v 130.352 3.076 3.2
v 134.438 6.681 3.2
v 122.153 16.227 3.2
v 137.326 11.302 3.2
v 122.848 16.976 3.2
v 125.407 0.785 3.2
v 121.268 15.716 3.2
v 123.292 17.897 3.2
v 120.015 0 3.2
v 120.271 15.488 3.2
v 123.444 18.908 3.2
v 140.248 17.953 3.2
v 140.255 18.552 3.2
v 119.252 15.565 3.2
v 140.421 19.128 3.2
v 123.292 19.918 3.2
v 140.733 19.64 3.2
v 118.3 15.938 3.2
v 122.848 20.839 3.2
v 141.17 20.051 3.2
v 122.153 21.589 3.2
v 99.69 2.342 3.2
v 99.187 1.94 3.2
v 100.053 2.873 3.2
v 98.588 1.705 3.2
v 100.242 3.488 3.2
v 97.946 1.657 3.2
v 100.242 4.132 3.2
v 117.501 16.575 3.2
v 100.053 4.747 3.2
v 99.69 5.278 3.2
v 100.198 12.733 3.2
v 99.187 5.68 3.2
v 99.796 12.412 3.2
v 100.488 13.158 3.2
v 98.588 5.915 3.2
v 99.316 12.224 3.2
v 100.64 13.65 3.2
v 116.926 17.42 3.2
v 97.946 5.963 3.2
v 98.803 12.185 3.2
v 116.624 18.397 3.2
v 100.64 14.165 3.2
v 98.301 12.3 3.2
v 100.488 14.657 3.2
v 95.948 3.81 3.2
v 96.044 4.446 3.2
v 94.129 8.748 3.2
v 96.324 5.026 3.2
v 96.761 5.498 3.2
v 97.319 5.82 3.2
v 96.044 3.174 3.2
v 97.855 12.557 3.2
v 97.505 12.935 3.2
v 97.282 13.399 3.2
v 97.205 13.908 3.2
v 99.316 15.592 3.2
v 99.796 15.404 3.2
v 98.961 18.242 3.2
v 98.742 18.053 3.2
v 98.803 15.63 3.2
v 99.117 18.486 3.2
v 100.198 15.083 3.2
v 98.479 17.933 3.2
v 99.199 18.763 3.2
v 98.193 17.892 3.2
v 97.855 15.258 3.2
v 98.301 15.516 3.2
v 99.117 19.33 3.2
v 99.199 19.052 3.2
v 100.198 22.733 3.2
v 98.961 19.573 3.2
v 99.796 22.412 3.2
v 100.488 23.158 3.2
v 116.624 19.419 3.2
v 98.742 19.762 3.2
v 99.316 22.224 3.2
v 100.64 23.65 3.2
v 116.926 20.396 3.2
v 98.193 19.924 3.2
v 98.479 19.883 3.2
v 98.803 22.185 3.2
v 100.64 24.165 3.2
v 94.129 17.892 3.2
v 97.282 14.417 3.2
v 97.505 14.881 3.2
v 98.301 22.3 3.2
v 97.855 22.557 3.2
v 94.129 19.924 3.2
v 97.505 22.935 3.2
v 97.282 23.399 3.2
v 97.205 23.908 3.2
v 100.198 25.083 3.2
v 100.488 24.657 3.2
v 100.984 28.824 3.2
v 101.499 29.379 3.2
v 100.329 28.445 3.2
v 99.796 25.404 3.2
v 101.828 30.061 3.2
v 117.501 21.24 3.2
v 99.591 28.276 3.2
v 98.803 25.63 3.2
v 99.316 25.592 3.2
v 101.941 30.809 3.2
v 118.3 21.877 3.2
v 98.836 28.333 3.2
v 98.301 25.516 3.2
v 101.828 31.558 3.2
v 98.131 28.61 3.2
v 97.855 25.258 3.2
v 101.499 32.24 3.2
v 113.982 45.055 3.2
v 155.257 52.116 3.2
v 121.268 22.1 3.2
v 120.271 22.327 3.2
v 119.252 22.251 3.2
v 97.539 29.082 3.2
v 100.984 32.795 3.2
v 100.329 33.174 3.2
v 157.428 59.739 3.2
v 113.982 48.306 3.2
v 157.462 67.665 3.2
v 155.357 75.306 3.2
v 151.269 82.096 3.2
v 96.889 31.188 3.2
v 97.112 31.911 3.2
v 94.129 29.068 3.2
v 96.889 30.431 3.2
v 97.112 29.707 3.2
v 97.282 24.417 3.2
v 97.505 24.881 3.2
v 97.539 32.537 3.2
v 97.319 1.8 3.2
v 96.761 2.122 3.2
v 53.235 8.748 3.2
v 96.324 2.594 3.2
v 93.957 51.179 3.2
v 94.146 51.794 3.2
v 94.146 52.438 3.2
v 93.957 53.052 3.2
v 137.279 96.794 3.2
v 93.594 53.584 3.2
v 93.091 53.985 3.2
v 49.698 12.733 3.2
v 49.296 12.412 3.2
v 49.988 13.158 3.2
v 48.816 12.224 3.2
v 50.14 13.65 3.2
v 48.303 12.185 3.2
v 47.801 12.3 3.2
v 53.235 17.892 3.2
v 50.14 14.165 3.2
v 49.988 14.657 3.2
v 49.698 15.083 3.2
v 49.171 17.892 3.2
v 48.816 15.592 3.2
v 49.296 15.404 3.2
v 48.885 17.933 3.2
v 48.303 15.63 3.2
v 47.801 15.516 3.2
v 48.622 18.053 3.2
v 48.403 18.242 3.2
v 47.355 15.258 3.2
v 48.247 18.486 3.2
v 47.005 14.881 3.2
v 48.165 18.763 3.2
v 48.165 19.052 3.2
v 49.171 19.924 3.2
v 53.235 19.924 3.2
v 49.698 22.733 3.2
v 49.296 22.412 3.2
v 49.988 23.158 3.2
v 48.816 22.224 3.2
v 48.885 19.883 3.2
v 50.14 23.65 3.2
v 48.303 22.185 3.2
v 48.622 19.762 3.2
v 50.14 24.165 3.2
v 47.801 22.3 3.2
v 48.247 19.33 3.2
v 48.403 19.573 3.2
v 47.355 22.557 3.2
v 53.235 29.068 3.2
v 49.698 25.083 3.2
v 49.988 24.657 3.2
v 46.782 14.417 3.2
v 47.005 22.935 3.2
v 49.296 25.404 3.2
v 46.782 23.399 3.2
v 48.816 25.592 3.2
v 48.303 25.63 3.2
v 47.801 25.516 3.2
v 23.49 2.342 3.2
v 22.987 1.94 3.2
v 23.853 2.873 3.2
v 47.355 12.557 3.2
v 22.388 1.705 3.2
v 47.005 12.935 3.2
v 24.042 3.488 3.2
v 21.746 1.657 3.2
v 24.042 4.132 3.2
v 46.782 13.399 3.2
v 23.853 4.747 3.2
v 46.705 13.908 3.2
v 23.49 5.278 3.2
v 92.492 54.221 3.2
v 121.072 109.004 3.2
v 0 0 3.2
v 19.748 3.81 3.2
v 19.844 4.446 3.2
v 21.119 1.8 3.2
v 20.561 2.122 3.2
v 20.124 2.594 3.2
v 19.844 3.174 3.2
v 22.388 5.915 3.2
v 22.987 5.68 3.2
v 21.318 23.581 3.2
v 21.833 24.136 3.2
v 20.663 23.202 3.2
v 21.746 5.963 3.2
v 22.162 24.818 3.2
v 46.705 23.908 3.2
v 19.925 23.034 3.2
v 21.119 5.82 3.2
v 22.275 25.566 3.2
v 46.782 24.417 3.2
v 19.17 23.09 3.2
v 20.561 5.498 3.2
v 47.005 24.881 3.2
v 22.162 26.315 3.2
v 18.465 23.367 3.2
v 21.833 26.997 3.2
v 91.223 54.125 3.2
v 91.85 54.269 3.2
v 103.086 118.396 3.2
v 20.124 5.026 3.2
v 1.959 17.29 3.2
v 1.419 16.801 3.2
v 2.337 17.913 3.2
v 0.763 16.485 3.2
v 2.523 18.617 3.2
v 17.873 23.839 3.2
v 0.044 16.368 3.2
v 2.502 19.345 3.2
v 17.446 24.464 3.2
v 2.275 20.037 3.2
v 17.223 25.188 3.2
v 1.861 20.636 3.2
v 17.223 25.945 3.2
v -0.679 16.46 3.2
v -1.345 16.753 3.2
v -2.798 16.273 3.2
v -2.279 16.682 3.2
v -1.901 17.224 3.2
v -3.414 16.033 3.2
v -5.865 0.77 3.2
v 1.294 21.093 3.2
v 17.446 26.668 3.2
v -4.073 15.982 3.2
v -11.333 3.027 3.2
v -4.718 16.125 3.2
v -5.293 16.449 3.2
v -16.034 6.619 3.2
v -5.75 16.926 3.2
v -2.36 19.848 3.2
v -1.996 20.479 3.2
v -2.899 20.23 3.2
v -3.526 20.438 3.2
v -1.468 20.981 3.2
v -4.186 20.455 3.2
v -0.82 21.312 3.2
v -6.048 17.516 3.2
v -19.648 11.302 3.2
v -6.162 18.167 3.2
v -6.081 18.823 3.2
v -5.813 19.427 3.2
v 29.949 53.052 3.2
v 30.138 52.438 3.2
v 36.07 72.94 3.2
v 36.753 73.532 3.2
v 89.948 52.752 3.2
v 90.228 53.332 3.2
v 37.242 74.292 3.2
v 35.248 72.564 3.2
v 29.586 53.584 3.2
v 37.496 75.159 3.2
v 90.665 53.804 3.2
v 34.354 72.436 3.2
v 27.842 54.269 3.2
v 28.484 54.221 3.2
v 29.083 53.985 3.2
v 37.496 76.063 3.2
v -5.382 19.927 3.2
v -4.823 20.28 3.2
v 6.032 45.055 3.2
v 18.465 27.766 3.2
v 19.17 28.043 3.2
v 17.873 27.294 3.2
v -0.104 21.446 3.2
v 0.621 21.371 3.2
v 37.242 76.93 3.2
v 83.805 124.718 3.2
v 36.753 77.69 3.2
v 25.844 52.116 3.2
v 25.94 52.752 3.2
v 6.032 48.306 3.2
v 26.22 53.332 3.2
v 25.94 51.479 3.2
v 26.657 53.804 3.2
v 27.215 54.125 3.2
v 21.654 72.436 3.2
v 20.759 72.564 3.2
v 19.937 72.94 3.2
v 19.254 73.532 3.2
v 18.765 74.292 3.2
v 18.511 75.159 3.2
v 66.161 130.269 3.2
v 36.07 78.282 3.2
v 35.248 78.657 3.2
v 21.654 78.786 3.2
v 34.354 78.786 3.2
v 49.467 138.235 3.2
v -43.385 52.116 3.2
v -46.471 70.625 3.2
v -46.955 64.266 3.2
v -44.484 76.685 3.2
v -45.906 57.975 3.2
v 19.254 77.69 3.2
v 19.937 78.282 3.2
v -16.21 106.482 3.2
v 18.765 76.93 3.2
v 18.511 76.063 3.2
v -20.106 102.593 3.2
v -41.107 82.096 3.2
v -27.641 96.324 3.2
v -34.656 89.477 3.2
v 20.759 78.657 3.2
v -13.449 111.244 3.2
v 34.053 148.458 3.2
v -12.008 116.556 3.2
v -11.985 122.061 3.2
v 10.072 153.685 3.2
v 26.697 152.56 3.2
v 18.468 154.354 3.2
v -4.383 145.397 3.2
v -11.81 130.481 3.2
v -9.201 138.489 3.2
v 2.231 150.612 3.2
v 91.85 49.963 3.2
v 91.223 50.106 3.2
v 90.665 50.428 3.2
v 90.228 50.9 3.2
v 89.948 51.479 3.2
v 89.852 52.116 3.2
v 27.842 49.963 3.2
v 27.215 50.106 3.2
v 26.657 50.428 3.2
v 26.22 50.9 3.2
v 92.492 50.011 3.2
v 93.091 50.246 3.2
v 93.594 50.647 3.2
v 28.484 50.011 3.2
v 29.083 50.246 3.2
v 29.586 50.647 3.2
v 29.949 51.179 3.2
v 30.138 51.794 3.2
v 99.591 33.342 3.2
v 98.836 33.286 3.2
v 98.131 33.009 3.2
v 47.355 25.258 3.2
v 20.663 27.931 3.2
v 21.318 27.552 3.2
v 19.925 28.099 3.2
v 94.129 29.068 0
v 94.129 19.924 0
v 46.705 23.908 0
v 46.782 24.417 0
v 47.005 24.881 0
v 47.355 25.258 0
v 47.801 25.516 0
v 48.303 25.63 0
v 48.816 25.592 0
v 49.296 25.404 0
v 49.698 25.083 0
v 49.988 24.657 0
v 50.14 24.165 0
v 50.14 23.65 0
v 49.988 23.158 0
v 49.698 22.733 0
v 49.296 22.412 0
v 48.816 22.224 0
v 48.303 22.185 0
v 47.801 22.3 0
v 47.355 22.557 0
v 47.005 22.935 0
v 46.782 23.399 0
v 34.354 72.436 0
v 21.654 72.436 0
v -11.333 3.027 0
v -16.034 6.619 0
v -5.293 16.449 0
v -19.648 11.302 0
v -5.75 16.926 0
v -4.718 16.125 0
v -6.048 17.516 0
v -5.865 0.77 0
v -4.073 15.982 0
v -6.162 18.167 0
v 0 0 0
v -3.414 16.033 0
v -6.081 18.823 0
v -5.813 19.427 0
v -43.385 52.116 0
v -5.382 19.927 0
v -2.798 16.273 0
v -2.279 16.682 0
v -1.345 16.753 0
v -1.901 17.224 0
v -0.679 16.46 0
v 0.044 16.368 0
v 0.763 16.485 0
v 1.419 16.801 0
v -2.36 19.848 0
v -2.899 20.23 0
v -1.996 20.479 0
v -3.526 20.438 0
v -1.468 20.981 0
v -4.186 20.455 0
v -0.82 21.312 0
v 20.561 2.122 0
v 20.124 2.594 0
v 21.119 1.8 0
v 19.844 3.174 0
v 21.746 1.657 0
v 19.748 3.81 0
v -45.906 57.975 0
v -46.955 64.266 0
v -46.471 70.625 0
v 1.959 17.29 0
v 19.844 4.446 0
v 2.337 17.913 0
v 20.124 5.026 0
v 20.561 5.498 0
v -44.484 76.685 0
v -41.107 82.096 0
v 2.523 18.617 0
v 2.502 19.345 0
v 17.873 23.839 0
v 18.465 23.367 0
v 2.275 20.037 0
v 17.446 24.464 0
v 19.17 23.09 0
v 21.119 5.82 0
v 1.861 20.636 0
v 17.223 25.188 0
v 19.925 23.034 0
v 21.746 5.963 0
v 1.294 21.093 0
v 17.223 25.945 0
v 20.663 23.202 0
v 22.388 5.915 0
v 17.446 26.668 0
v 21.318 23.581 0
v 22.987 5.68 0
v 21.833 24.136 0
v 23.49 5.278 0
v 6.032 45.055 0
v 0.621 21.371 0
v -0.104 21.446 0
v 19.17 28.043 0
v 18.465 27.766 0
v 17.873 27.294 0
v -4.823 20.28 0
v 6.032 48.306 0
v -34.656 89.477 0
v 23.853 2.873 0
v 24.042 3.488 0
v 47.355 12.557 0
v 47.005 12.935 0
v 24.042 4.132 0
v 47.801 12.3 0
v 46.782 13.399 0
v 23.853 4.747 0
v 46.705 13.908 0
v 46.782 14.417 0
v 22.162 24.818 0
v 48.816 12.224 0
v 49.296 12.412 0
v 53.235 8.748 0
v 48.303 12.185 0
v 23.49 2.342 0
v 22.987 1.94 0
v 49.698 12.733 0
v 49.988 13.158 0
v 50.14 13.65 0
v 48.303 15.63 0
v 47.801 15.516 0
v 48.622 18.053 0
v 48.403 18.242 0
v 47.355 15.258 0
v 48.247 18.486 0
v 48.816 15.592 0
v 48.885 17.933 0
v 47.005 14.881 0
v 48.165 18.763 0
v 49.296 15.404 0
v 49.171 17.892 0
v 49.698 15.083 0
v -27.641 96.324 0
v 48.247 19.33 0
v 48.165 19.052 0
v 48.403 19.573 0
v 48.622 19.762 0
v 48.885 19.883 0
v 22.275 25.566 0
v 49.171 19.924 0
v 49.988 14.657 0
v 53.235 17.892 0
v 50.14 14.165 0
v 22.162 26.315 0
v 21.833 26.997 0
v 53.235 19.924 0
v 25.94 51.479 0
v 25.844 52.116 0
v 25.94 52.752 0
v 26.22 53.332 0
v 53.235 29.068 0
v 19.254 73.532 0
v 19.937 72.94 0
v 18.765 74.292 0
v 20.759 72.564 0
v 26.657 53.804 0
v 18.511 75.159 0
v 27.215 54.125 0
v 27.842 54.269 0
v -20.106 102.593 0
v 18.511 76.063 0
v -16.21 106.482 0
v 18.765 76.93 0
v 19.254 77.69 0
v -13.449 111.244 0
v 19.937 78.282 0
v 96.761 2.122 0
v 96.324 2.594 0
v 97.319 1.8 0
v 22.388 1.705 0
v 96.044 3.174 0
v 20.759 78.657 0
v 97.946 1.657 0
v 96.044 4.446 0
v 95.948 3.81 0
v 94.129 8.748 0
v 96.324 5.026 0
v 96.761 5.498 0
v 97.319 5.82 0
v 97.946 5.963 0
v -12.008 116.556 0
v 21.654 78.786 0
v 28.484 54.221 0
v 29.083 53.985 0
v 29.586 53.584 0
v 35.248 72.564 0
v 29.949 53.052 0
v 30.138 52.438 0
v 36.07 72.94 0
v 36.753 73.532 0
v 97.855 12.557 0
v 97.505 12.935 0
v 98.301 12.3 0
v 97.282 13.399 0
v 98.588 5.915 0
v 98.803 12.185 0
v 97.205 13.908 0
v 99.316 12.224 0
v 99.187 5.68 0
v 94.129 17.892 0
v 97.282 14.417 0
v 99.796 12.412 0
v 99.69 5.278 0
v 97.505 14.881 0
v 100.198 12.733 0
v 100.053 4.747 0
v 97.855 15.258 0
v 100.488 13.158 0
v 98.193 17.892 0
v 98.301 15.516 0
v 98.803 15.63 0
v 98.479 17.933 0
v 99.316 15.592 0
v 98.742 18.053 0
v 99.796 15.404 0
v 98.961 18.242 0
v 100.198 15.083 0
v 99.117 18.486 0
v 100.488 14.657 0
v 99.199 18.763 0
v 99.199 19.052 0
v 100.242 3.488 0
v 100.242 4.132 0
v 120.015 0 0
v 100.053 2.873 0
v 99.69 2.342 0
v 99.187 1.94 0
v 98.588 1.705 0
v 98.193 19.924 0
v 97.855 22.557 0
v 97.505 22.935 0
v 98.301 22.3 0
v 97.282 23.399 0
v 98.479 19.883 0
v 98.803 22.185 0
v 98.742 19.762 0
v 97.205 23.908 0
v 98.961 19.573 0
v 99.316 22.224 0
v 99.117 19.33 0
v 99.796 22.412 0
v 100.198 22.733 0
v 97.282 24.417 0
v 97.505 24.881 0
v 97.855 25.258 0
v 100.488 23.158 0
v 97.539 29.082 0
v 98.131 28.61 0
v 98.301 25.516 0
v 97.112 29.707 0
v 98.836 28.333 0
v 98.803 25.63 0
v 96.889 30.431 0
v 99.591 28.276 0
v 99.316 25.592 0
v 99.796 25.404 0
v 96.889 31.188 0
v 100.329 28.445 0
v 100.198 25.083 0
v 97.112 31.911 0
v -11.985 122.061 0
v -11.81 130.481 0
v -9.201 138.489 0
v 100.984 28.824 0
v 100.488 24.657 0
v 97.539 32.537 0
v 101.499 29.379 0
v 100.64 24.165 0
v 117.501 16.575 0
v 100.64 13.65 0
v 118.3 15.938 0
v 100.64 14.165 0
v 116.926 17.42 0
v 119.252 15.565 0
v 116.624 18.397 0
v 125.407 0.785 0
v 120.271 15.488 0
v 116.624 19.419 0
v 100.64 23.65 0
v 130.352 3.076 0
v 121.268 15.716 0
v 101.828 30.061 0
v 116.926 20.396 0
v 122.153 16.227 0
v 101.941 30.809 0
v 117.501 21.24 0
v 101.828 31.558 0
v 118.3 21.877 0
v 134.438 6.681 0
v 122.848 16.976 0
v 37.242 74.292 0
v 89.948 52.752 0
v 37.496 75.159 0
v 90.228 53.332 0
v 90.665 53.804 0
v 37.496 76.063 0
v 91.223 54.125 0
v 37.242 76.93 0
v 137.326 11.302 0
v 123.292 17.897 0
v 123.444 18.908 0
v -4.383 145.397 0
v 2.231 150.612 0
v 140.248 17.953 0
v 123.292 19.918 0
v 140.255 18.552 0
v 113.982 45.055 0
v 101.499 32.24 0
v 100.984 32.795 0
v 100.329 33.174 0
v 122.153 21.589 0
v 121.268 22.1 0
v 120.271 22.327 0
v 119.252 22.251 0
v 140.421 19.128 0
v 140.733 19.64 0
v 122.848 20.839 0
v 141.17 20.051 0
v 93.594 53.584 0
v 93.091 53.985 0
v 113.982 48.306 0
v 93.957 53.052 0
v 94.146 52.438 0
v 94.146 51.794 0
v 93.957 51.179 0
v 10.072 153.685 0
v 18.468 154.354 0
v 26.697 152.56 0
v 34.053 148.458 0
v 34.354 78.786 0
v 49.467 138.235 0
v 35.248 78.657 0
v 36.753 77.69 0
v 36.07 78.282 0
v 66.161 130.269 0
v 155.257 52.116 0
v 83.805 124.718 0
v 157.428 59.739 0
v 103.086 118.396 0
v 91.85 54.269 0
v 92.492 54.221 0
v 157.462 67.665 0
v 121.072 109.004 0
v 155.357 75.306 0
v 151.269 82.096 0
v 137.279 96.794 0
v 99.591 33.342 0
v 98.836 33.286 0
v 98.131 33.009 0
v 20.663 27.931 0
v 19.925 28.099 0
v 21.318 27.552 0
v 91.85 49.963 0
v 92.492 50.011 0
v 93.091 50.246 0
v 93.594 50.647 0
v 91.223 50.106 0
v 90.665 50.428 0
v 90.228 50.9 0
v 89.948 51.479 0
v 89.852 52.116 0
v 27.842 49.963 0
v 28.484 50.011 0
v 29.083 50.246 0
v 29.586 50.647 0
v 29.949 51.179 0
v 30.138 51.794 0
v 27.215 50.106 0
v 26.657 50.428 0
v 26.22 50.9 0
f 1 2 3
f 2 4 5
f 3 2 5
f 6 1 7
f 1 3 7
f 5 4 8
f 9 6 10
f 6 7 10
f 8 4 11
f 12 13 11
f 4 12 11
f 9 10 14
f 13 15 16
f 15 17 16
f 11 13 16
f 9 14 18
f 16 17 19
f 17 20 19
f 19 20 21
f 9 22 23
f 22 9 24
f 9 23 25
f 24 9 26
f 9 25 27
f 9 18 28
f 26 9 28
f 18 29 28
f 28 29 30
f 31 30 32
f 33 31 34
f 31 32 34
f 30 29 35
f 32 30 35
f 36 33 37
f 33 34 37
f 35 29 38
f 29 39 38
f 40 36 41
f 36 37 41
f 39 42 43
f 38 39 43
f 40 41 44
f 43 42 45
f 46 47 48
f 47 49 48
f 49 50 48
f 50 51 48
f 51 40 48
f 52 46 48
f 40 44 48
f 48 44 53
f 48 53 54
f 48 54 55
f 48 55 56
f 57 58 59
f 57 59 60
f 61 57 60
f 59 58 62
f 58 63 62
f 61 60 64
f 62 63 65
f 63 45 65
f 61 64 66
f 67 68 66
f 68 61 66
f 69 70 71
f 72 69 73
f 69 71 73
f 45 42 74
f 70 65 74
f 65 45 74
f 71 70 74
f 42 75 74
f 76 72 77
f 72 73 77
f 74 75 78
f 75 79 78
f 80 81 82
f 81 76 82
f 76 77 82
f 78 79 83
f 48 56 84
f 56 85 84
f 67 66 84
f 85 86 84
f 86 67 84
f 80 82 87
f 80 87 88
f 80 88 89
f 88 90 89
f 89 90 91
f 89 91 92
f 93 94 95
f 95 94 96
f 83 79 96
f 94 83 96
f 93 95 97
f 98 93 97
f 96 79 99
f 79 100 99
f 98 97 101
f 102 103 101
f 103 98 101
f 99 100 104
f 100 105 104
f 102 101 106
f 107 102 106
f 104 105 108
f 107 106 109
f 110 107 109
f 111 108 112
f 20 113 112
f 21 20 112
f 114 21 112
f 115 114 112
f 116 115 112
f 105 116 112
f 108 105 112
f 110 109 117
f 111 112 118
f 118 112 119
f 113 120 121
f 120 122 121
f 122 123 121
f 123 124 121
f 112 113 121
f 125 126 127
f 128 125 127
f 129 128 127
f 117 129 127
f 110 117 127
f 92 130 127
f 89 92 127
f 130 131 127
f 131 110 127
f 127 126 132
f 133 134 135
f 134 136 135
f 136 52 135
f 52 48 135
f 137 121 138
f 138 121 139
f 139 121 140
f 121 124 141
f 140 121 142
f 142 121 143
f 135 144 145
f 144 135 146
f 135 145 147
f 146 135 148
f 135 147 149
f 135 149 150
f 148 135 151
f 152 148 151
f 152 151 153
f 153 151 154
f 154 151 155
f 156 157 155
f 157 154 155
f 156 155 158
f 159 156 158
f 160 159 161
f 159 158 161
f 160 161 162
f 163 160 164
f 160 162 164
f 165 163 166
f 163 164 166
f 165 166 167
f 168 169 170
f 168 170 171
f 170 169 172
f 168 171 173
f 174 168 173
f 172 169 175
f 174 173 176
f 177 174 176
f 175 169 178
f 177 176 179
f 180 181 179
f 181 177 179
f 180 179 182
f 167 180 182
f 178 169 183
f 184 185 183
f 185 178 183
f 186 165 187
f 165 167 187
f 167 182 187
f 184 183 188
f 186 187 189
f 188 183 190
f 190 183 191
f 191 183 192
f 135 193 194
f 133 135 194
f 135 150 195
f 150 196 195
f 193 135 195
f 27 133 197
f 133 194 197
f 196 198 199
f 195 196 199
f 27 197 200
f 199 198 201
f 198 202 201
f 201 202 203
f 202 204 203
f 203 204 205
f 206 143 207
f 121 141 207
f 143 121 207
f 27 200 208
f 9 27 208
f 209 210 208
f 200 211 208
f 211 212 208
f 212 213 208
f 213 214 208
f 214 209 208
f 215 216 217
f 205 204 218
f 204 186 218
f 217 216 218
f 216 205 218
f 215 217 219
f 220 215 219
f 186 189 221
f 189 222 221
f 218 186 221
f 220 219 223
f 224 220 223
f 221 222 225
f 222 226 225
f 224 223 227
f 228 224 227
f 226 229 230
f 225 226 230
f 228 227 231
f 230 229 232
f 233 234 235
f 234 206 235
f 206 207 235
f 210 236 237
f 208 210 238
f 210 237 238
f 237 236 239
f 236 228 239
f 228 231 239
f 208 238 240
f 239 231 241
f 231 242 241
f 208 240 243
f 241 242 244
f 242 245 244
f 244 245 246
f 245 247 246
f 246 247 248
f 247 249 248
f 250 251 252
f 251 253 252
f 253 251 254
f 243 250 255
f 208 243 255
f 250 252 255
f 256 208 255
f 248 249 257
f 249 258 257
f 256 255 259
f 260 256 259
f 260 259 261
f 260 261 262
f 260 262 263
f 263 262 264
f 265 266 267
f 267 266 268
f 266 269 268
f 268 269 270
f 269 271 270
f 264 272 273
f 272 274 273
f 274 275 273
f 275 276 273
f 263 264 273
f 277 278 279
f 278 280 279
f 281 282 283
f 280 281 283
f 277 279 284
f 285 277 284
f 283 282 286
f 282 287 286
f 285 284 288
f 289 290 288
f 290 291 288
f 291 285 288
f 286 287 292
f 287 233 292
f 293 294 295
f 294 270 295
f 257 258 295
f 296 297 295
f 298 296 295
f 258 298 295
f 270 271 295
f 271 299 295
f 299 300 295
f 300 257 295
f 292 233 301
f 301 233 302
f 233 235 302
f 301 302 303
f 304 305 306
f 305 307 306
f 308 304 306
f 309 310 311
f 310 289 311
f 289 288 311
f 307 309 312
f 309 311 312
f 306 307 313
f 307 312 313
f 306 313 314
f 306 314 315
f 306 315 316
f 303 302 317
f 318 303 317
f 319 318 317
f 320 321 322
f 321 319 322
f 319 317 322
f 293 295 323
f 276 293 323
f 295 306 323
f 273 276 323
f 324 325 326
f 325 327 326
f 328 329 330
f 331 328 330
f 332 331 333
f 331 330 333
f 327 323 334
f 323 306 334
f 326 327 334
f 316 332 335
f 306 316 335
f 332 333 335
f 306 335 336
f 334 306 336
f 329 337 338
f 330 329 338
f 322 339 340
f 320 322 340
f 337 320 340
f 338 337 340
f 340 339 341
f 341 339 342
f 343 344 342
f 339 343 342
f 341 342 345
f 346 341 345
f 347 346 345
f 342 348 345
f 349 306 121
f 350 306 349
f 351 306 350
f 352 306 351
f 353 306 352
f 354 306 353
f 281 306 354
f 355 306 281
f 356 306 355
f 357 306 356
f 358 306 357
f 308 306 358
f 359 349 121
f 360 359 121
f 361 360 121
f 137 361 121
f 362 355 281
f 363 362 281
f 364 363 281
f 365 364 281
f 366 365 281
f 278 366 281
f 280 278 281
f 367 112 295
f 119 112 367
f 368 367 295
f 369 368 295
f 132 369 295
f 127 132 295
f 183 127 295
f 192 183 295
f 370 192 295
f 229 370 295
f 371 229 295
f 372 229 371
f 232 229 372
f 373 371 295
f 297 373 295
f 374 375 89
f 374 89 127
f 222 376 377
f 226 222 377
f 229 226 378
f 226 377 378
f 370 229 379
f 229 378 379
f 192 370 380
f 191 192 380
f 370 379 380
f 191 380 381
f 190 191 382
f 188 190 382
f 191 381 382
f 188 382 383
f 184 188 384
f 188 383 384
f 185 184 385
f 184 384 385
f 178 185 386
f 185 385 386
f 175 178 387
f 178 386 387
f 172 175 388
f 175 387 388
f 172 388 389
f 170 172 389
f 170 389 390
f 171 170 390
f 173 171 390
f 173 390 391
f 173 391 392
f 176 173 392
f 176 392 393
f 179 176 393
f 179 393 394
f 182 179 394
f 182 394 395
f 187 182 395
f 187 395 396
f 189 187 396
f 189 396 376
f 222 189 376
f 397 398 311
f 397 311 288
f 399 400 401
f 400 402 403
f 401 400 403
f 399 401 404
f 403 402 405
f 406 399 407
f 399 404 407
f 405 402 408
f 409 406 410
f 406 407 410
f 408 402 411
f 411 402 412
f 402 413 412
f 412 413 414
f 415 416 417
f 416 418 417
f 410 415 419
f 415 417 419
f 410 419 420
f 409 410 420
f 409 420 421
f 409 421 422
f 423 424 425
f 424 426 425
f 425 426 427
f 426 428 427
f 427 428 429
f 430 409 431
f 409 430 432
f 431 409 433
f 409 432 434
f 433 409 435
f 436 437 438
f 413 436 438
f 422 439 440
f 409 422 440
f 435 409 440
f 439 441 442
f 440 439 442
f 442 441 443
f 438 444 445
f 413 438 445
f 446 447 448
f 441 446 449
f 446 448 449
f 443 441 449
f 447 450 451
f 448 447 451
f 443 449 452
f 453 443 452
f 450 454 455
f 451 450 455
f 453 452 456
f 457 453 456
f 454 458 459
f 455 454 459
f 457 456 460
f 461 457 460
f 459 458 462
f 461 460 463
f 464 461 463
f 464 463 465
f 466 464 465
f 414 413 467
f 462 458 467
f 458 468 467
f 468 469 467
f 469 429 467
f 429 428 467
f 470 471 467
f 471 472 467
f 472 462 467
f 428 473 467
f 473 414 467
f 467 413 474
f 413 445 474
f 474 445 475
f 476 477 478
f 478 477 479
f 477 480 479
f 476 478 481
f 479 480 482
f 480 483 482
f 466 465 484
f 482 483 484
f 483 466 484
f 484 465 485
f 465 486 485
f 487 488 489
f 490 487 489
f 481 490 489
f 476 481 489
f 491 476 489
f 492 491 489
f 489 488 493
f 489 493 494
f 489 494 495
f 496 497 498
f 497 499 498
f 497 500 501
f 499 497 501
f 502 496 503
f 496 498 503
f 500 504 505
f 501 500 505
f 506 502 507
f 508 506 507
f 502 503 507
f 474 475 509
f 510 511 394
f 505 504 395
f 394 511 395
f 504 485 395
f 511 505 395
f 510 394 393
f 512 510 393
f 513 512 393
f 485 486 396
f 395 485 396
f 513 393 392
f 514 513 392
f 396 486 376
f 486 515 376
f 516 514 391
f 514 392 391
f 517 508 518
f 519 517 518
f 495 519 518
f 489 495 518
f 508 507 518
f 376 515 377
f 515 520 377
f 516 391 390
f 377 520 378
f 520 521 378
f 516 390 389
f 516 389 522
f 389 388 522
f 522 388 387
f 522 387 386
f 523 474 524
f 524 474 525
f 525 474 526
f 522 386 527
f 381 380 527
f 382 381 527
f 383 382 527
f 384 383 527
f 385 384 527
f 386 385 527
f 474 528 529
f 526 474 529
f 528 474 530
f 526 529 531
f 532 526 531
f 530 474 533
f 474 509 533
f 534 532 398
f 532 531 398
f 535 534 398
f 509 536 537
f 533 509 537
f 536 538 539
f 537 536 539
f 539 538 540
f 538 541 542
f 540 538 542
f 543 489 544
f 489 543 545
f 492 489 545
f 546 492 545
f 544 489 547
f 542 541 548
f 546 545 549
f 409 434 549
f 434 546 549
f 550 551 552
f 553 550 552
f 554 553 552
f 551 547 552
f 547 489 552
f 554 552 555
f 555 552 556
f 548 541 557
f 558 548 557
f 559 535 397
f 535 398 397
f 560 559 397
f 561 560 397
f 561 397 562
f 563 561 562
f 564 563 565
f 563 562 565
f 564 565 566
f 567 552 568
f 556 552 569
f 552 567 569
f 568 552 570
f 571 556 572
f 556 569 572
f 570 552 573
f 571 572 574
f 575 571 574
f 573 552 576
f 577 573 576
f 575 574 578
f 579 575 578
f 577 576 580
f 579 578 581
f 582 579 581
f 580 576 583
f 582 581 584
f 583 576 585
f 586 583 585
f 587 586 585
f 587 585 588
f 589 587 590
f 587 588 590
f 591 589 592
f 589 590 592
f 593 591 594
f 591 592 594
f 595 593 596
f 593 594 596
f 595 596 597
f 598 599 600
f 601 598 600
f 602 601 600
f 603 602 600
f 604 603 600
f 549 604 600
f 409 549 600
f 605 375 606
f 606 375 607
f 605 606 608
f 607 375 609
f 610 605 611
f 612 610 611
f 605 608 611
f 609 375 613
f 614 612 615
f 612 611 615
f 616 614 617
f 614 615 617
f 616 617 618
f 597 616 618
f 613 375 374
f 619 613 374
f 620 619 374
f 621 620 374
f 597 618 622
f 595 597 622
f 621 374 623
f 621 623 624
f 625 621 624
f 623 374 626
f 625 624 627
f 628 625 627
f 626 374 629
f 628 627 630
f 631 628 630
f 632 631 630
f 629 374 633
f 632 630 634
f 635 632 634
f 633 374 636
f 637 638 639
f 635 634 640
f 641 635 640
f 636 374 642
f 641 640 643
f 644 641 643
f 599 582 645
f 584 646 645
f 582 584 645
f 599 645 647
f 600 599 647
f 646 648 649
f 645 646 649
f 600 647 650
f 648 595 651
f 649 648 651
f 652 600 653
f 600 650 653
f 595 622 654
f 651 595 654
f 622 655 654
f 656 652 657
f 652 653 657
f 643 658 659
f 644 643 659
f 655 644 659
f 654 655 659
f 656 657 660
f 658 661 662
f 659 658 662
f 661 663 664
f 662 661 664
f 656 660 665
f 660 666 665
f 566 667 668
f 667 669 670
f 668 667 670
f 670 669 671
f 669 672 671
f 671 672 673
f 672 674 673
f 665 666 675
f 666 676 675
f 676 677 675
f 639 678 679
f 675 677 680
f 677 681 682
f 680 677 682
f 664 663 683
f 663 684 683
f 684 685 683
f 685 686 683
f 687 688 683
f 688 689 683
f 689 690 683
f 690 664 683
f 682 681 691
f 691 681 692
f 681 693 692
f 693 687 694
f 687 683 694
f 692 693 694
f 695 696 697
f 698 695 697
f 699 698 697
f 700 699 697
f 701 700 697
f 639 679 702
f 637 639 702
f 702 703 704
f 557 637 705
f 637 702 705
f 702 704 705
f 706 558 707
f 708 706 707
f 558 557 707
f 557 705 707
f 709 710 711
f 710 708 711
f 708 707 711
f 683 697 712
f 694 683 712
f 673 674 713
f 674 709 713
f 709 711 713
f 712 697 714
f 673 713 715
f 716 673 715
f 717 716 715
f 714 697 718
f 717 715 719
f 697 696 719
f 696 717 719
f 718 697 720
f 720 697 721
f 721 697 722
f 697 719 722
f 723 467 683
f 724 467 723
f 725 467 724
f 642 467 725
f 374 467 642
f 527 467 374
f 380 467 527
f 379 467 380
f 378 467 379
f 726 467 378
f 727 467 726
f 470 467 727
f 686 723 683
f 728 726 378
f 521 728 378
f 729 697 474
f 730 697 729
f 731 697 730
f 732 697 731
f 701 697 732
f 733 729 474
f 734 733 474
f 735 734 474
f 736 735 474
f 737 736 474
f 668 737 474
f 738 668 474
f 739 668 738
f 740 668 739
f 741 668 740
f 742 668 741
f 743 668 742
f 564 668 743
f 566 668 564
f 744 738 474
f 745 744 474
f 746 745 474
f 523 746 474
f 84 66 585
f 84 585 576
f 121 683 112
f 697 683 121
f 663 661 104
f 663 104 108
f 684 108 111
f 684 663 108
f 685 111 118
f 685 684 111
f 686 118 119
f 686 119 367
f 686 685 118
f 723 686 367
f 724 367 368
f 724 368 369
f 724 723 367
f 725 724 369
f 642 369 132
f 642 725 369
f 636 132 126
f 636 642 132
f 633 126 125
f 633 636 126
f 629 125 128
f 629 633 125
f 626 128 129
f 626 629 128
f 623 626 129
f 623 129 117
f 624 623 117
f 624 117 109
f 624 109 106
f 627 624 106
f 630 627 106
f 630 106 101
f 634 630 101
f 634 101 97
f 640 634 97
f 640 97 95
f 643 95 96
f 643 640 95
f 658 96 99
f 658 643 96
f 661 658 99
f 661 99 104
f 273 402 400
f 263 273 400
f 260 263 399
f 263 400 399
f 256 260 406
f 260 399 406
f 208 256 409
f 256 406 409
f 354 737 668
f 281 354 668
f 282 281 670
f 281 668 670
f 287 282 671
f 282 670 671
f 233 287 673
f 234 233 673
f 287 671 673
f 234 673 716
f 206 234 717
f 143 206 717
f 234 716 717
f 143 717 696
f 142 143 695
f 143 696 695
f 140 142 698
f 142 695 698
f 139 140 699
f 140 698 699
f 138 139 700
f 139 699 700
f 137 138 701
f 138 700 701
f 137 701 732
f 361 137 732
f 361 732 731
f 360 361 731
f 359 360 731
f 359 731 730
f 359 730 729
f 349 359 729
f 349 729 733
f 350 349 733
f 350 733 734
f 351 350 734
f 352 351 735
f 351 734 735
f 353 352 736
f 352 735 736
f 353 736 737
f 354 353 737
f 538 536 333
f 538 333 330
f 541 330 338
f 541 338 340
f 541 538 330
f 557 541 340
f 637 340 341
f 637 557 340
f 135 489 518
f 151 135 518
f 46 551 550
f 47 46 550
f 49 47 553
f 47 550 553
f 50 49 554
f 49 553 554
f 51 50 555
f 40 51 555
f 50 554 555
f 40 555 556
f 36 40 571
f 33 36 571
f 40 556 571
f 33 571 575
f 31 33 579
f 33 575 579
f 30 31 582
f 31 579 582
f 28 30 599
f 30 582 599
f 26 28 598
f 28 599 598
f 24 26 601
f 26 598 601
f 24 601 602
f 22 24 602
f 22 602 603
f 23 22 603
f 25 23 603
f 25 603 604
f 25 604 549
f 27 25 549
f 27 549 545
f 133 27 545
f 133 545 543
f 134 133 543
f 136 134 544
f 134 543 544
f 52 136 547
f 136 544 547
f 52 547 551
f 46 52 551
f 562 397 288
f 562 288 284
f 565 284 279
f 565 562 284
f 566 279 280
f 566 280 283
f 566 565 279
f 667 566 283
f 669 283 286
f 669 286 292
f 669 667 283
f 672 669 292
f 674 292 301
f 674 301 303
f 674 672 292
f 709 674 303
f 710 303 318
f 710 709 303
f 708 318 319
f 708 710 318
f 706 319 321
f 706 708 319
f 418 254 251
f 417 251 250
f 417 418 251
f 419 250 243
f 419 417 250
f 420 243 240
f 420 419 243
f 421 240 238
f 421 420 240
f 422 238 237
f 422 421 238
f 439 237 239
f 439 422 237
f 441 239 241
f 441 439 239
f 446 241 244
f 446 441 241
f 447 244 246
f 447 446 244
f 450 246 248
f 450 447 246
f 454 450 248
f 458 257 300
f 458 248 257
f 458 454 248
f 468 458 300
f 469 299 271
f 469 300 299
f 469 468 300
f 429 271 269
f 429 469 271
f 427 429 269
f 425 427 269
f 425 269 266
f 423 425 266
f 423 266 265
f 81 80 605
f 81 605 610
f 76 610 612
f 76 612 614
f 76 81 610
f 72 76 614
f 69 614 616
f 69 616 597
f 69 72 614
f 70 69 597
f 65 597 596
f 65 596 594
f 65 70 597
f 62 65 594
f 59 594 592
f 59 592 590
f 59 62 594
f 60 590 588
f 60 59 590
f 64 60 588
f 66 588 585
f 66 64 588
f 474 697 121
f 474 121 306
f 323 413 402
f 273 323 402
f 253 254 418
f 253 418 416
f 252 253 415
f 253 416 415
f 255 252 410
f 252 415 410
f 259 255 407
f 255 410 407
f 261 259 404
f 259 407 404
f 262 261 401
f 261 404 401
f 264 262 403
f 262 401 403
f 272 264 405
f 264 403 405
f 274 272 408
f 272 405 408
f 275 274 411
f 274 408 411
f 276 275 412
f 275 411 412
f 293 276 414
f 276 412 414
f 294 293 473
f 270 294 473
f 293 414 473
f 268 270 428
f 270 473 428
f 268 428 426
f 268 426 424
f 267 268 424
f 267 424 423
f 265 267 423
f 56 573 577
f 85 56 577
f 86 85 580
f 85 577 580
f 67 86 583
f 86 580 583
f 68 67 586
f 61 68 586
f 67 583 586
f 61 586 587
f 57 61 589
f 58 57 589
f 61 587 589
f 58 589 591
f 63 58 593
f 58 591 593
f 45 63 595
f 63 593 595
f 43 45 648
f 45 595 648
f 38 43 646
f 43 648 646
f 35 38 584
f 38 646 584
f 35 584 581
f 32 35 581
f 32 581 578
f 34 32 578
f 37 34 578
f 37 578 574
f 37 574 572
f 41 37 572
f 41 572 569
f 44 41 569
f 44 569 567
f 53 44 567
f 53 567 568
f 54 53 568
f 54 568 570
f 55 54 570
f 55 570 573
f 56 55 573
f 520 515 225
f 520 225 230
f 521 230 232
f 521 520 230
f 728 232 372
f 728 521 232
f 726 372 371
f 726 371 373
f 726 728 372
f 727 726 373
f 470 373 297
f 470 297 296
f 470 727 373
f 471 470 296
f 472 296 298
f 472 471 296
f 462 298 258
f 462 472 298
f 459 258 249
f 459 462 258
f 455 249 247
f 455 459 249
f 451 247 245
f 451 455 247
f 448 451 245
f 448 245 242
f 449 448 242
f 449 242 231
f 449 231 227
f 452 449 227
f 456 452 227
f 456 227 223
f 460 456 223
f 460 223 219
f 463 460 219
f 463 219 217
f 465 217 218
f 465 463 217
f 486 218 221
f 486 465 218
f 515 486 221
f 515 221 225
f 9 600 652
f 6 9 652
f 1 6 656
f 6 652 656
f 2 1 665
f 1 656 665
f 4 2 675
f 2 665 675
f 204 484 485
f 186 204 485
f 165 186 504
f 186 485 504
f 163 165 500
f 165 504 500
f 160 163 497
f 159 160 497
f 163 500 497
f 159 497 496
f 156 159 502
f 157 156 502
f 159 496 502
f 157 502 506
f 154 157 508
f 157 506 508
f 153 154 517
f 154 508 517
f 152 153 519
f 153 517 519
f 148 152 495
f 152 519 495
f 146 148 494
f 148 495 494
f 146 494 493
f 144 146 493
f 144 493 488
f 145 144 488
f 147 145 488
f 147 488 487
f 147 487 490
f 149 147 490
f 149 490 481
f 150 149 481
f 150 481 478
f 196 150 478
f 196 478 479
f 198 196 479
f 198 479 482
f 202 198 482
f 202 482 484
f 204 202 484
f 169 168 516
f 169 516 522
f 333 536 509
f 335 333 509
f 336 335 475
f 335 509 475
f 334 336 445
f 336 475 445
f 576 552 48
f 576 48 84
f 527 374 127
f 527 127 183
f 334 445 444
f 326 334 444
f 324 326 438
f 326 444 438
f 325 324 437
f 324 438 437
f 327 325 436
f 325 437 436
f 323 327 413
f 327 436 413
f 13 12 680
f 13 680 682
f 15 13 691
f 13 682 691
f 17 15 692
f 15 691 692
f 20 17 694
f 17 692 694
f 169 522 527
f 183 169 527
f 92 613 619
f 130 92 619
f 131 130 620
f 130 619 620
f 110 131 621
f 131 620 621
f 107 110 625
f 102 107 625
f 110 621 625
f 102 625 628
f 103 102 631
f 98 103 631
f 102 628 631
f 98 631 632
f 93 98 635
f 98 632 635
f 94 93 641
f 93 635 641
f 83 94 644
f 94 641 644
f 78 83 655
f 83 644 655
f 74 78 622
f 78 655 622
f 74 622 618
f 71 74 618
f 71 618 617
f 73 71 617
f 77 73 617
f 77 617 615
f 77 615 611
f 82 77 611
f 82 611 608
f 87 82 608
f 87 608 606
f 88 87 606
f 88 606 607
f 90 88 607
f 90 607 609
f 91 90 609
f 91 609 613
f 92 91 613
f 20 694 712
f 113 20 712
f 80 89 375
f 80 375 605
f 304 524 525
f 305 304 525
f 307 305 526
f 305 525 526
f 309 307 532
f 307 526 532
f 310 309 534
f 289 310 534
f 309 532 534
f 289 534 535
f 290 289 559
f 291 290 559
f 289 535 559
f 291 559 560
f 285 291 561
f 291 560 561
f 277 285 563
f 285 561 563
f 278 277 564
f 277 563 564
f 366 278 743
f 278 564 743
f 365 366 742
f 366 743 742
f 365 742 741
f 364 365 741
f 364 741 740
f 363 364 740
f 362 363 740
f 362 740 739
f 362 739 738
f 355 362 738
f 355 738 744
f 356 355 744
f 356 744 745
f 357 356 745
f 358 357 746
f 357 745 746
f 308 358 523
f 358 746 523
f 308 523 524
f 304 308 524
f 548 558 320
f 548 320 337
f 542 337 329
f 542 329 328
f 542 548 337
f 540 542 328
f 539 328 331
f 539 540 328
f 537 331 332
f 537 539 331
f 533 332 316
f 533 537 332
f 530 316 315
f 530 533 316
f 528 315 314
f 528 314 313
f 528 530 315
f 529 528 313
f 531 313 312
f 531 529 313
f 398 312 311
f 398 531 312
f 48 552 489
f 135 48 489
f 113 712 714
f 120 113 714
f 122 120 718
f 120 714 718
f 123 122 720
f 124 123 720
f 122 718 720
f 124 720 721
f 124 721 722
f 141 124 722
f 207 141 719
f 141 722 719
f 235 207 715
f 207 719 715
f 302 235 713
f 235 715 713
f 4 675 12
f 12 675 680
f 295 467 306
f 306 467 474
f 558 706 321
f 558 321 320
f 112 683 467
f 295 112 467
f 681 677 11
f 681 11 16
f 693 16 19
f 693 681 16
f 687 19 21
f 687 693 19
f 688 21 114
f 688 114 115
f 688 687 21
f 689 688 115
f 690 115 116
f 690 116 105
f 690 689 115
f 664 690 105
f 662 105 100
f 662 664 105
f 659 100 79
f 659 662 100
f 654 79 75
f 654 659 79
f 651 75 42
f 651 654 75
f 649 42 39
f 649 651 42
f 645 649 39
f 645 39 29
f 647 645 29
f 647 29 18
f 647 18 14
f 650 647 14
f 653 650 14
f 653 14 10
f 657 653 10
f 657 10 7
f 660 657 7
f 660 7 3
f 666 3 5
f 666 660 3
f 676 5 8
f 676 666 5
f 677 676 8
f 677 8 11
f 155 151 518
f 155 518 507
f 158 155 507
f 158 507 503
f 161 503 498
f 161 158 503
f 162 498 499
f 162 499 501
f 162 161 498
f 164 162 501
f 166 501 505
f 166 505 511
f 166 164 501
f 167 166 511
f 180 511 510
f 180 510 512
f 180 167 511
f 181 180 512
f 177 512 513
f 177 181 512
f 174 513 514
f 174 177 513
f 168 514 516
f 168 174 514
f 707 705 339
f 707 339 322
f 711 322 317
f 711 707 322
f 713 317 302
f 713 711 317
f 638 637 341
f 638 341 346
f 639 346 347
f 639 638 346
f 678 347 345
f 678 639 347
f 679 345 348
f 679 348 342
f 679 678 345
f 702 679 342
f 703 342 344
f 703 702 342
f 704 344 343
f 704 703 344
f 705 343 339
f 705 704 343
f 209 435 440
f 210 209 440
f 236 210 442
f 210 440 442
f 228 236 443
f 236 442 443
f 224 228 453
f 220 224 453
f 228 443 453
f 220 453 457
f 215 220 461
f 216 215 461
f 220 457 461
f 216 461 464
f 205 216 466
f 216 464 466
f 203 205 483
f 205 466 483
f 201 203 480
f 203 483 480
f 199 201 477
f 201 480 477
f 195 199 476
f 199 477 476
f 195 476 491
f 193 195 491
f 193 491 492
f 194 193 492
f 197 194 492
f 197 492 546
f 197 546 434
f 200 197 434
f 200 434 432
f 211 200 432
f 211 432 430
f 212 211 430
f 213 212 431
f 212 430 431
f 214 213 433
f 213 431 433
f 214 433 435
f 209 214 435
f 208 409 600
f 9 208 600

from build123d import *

# Parameters (mm, degrees)
SKETCH1_R           = 3.429
SKETCH1_R_2         = 2.54
BOSS_EXTRUDE1_DEPTH = 3.2004
SKETCH2_R           = 2.159
CUT_EXTRUDE1_DEPTH  = 3.2004
SKETCH5_R           = 1.7272
SKETCH5_W           = 40.894
SKETCH5_H           = 20.32
CUT_EXTRUDE3_DEPTH  = 4.2004
CUT_EXTRUDE4_DEPTH  = 3.2004
CUT_EXTRUDE8_DEPTH  = 3.2004
SKETCH11_W          = 107.95
SKETCH11_H          = 3.2512
CUT_EXTRUDE9_DEPTH  = 3.2004
SKETCH12_R          = 2.2479
CUT_EXTRUDE10_DEPTH = 3.2004
BOSS_EXTRUDE2_DEPTH = 3.2004


with BuildPart() as part:
    # Sketch1 → Boss-Extrude1 (new body)
    with BuildSketch(Plane.XY):
        with BuildLine():
            Line((0, 0), (120.015, 0))
            ThreePointArc((120.015, 0), (130.351788397, 3.075697789), (137.325636158, 11.302152593))
            Line((137.325636158, 11.302152593), (155.257499999, 52.11572))
            ThreePointArc((155.257499999, 52.11572), (157.462147967, 67.664529981), (151.26869294, 82.095991421))
            ThreePointArc((151.26869294, 82.095991421), (55.081013593, 128.103082212), (-41.106665754, 82.095991421))
            ThreePointArc((-41.106665754, 82.095991421), (-46.904819593, 67.459968464), (-43.385473773, 52.11572))
            Line((-43.385473773, 52.11572), (-19.648099871, 11.302152593))
            ThreePointArc((-19.648099871, 11.302152593), (-11.333429333, 3.027112684), (0, 0))
        make_face()
        with Locations((120.015, 18.90776)):
            Circle(SKETCH1_R, mode=Mode.SUBTRACT)
        with Locations((0, 18.90776)):
            Circle(SKETCH1_R_2, mode=Mode.SUBTRACT)
        with Locations((19.734727626, 25.566426992)):
            Circle(SKETCH1_R_2, mode=Mode.SUBTRACT)
        with Locations((99.400822531, 30.809360911)):
            Circle(SKETCH1_R_2, mode=Mode.SUBTRACT)
    extrude(amount=BOSS_EXTRUDE1_DEPTH)

    # Sketch2 → Cut-Extrude1 (cut)
    with BuildSketch(Plane(origin=(0, 0, 0), x_dir=(-1, 0, 0), z_dir=(0, 0, -1))):
        with Locations((-92.0115, 52.115719911)):
            Circle(SKETCH2_R)
        with Locations((-28.0035, 52.115719911)):
            Circle(SKETCH2_R)
        with Locations((-98.1075, 3.81)):
            Circle(SKETCH2_R)
        with Locations((-21.9075, 3.81)):
            Circle(SKETCH2_R)
    extrude(amount=-CUT_EXTRUDE1_DEPTH, mode=Mode.SUBTRACT)

    # Sketch5 → Cut-Extrude3 (cut, through all)
    with BuildSketch(Plane(origin=(0, 0, 0), x_dir=(-1, 0, 0), z_dir=(0, 0, -1))):
        with Locations((-98.932021292, 23.90776)):
            Circle(SKETCH5_R)
        with Locations((-48.432021292, 13.90776)):
            Circle(SKETCH5_R)
        with Locations((-48.432021292, 23.90776)):
            Circle(SKETCH5_R)
        with Locations((-98.932021292, 13.90776)):
            Circle(SKETCH5_R)
        with Locations((-73.682021292, 18.90776)):
            Rectangle(SKETCH5_W, SKETCH5_H)
    extrude(amount=-CUT_EXTRUDE3_DEPTH, mode=Mode.SUBTRACT)

    # Sketch6 → Cut-Extrude4 (cut)
    with BuildSketch(Plane.XY.offset(3.2004)):
        with BuildLine():
            Line((49.171021292, 19.92376), (53.235021292, 19.92376))
            Line((53.235021292, 19.92376), (53.235021292, 17.89176))
            Line((53.235021292, 17.89176), (49.171021292, 17.89176))
            ThreePointArc((49.171021292, 17.89176), (48.155021292, 18.90776), (49.171021292, 19.92376))
        make_face()
        with BuildLine():
            Line((94.129021292, 19.92376), (98.193021292, 19.92376))
            ThreePointArc((98.193021292, 19.92376), (99.209021292, 18.90776), (98.193021292, 17.89176))
            Line((98.193021292, 17.89176), (94.129021292, 17.89176))
            Line((94.129021292, 17.89176), (94.129021292, 19.92376))
        make_face()
    extrude(amount=-CUT_EXTRUDE4_DEPTH, mode=Mode.SUBTRACT)

    # Sketch10 → Cut-Extrude8 (cut)
    with BuildSketch(Plane(origin=(0, 0, 0), x_dir=(-1, 0, 0), z_dir=(0, 0, -1))):
        with BuildLine():
            Line((-34.3535, 78.785719911), (-21.6535, 78.785719911))
            ThreePointArc((-21.6535, 78.785719911), (-18.4785, 75.610719911), (-21.6535, 72.435719911))
            Line((-21.6535, 72.435719911), (-34.3535, 72.435719911))
            ThreePointArc((-34.3535, 72.435719911), (-37.5285, 75.610719911), (-34.3535, 78.785719911))
        make_face()
    extrude(amount=-CUT_EXTRUDE8_DEPTH, mode=Mode.SUBTRACT)

    # Sketch11 → Cut-Extrude9 (cut)
    with BuildSketch(Plane(origin=(0, 0, 0), x_dir=(-1, 0, 0), z_dir=(0, 0, -1))):
        with Locations((-60.0075, 46.680119911)):
            Rectangle(SKETCH11_W, SKETCH11_H)
    extrude(amount=-CUT_EXTRUDE9_DEPTH, mode=Mode.SUBTRACT)

    # Sketch12 → Cut-Extrude10 (cut)
    with BuildSketch(Plane(origin=(0, 0, 0), x_dir=(-1, 0, 0), z_dir=(0, 0, -1))):
        with Locations((-142.479014632, 18.224067698)):
            Circle(SKETCH12_R)
        with Locations((3.91433865, 18.224067698)):
            Circle(SKETCH12_R)
    extrude(amount=-CUT_EXTRUDE10_DEPTH, mode=Mode.SUBTRACT)

    # Sketch13 → Boss-Extrude2 (add)
    with BuildSketch(Plane(origin=(0, 0, 0), x_dir=(-1, 0, 0), z_dir=(0, 0, -1))):
        with BuildLine():
            Line((-83.804619012, 124.717903232), (20.105573885, 102.592791936))
            ThreePointArc((20.105573885, 102.592791936), (13.448555565, 111.243555983), (11.985080528, 122.060665224))
            ThreePointArc((11.985080528, 122.060665224), (-2.230930753, 150.611793246), (-34.052645197, 148.457639581))
            ThreePointArc((-34.052645197, 148.457639581), (-57.67418009, 133.958784174), (-83.804619012, 124.717903232))
        make_face()
    extrude(amount=-BOSS_EXTRUDE2_DEPTH)


solid = part.part
